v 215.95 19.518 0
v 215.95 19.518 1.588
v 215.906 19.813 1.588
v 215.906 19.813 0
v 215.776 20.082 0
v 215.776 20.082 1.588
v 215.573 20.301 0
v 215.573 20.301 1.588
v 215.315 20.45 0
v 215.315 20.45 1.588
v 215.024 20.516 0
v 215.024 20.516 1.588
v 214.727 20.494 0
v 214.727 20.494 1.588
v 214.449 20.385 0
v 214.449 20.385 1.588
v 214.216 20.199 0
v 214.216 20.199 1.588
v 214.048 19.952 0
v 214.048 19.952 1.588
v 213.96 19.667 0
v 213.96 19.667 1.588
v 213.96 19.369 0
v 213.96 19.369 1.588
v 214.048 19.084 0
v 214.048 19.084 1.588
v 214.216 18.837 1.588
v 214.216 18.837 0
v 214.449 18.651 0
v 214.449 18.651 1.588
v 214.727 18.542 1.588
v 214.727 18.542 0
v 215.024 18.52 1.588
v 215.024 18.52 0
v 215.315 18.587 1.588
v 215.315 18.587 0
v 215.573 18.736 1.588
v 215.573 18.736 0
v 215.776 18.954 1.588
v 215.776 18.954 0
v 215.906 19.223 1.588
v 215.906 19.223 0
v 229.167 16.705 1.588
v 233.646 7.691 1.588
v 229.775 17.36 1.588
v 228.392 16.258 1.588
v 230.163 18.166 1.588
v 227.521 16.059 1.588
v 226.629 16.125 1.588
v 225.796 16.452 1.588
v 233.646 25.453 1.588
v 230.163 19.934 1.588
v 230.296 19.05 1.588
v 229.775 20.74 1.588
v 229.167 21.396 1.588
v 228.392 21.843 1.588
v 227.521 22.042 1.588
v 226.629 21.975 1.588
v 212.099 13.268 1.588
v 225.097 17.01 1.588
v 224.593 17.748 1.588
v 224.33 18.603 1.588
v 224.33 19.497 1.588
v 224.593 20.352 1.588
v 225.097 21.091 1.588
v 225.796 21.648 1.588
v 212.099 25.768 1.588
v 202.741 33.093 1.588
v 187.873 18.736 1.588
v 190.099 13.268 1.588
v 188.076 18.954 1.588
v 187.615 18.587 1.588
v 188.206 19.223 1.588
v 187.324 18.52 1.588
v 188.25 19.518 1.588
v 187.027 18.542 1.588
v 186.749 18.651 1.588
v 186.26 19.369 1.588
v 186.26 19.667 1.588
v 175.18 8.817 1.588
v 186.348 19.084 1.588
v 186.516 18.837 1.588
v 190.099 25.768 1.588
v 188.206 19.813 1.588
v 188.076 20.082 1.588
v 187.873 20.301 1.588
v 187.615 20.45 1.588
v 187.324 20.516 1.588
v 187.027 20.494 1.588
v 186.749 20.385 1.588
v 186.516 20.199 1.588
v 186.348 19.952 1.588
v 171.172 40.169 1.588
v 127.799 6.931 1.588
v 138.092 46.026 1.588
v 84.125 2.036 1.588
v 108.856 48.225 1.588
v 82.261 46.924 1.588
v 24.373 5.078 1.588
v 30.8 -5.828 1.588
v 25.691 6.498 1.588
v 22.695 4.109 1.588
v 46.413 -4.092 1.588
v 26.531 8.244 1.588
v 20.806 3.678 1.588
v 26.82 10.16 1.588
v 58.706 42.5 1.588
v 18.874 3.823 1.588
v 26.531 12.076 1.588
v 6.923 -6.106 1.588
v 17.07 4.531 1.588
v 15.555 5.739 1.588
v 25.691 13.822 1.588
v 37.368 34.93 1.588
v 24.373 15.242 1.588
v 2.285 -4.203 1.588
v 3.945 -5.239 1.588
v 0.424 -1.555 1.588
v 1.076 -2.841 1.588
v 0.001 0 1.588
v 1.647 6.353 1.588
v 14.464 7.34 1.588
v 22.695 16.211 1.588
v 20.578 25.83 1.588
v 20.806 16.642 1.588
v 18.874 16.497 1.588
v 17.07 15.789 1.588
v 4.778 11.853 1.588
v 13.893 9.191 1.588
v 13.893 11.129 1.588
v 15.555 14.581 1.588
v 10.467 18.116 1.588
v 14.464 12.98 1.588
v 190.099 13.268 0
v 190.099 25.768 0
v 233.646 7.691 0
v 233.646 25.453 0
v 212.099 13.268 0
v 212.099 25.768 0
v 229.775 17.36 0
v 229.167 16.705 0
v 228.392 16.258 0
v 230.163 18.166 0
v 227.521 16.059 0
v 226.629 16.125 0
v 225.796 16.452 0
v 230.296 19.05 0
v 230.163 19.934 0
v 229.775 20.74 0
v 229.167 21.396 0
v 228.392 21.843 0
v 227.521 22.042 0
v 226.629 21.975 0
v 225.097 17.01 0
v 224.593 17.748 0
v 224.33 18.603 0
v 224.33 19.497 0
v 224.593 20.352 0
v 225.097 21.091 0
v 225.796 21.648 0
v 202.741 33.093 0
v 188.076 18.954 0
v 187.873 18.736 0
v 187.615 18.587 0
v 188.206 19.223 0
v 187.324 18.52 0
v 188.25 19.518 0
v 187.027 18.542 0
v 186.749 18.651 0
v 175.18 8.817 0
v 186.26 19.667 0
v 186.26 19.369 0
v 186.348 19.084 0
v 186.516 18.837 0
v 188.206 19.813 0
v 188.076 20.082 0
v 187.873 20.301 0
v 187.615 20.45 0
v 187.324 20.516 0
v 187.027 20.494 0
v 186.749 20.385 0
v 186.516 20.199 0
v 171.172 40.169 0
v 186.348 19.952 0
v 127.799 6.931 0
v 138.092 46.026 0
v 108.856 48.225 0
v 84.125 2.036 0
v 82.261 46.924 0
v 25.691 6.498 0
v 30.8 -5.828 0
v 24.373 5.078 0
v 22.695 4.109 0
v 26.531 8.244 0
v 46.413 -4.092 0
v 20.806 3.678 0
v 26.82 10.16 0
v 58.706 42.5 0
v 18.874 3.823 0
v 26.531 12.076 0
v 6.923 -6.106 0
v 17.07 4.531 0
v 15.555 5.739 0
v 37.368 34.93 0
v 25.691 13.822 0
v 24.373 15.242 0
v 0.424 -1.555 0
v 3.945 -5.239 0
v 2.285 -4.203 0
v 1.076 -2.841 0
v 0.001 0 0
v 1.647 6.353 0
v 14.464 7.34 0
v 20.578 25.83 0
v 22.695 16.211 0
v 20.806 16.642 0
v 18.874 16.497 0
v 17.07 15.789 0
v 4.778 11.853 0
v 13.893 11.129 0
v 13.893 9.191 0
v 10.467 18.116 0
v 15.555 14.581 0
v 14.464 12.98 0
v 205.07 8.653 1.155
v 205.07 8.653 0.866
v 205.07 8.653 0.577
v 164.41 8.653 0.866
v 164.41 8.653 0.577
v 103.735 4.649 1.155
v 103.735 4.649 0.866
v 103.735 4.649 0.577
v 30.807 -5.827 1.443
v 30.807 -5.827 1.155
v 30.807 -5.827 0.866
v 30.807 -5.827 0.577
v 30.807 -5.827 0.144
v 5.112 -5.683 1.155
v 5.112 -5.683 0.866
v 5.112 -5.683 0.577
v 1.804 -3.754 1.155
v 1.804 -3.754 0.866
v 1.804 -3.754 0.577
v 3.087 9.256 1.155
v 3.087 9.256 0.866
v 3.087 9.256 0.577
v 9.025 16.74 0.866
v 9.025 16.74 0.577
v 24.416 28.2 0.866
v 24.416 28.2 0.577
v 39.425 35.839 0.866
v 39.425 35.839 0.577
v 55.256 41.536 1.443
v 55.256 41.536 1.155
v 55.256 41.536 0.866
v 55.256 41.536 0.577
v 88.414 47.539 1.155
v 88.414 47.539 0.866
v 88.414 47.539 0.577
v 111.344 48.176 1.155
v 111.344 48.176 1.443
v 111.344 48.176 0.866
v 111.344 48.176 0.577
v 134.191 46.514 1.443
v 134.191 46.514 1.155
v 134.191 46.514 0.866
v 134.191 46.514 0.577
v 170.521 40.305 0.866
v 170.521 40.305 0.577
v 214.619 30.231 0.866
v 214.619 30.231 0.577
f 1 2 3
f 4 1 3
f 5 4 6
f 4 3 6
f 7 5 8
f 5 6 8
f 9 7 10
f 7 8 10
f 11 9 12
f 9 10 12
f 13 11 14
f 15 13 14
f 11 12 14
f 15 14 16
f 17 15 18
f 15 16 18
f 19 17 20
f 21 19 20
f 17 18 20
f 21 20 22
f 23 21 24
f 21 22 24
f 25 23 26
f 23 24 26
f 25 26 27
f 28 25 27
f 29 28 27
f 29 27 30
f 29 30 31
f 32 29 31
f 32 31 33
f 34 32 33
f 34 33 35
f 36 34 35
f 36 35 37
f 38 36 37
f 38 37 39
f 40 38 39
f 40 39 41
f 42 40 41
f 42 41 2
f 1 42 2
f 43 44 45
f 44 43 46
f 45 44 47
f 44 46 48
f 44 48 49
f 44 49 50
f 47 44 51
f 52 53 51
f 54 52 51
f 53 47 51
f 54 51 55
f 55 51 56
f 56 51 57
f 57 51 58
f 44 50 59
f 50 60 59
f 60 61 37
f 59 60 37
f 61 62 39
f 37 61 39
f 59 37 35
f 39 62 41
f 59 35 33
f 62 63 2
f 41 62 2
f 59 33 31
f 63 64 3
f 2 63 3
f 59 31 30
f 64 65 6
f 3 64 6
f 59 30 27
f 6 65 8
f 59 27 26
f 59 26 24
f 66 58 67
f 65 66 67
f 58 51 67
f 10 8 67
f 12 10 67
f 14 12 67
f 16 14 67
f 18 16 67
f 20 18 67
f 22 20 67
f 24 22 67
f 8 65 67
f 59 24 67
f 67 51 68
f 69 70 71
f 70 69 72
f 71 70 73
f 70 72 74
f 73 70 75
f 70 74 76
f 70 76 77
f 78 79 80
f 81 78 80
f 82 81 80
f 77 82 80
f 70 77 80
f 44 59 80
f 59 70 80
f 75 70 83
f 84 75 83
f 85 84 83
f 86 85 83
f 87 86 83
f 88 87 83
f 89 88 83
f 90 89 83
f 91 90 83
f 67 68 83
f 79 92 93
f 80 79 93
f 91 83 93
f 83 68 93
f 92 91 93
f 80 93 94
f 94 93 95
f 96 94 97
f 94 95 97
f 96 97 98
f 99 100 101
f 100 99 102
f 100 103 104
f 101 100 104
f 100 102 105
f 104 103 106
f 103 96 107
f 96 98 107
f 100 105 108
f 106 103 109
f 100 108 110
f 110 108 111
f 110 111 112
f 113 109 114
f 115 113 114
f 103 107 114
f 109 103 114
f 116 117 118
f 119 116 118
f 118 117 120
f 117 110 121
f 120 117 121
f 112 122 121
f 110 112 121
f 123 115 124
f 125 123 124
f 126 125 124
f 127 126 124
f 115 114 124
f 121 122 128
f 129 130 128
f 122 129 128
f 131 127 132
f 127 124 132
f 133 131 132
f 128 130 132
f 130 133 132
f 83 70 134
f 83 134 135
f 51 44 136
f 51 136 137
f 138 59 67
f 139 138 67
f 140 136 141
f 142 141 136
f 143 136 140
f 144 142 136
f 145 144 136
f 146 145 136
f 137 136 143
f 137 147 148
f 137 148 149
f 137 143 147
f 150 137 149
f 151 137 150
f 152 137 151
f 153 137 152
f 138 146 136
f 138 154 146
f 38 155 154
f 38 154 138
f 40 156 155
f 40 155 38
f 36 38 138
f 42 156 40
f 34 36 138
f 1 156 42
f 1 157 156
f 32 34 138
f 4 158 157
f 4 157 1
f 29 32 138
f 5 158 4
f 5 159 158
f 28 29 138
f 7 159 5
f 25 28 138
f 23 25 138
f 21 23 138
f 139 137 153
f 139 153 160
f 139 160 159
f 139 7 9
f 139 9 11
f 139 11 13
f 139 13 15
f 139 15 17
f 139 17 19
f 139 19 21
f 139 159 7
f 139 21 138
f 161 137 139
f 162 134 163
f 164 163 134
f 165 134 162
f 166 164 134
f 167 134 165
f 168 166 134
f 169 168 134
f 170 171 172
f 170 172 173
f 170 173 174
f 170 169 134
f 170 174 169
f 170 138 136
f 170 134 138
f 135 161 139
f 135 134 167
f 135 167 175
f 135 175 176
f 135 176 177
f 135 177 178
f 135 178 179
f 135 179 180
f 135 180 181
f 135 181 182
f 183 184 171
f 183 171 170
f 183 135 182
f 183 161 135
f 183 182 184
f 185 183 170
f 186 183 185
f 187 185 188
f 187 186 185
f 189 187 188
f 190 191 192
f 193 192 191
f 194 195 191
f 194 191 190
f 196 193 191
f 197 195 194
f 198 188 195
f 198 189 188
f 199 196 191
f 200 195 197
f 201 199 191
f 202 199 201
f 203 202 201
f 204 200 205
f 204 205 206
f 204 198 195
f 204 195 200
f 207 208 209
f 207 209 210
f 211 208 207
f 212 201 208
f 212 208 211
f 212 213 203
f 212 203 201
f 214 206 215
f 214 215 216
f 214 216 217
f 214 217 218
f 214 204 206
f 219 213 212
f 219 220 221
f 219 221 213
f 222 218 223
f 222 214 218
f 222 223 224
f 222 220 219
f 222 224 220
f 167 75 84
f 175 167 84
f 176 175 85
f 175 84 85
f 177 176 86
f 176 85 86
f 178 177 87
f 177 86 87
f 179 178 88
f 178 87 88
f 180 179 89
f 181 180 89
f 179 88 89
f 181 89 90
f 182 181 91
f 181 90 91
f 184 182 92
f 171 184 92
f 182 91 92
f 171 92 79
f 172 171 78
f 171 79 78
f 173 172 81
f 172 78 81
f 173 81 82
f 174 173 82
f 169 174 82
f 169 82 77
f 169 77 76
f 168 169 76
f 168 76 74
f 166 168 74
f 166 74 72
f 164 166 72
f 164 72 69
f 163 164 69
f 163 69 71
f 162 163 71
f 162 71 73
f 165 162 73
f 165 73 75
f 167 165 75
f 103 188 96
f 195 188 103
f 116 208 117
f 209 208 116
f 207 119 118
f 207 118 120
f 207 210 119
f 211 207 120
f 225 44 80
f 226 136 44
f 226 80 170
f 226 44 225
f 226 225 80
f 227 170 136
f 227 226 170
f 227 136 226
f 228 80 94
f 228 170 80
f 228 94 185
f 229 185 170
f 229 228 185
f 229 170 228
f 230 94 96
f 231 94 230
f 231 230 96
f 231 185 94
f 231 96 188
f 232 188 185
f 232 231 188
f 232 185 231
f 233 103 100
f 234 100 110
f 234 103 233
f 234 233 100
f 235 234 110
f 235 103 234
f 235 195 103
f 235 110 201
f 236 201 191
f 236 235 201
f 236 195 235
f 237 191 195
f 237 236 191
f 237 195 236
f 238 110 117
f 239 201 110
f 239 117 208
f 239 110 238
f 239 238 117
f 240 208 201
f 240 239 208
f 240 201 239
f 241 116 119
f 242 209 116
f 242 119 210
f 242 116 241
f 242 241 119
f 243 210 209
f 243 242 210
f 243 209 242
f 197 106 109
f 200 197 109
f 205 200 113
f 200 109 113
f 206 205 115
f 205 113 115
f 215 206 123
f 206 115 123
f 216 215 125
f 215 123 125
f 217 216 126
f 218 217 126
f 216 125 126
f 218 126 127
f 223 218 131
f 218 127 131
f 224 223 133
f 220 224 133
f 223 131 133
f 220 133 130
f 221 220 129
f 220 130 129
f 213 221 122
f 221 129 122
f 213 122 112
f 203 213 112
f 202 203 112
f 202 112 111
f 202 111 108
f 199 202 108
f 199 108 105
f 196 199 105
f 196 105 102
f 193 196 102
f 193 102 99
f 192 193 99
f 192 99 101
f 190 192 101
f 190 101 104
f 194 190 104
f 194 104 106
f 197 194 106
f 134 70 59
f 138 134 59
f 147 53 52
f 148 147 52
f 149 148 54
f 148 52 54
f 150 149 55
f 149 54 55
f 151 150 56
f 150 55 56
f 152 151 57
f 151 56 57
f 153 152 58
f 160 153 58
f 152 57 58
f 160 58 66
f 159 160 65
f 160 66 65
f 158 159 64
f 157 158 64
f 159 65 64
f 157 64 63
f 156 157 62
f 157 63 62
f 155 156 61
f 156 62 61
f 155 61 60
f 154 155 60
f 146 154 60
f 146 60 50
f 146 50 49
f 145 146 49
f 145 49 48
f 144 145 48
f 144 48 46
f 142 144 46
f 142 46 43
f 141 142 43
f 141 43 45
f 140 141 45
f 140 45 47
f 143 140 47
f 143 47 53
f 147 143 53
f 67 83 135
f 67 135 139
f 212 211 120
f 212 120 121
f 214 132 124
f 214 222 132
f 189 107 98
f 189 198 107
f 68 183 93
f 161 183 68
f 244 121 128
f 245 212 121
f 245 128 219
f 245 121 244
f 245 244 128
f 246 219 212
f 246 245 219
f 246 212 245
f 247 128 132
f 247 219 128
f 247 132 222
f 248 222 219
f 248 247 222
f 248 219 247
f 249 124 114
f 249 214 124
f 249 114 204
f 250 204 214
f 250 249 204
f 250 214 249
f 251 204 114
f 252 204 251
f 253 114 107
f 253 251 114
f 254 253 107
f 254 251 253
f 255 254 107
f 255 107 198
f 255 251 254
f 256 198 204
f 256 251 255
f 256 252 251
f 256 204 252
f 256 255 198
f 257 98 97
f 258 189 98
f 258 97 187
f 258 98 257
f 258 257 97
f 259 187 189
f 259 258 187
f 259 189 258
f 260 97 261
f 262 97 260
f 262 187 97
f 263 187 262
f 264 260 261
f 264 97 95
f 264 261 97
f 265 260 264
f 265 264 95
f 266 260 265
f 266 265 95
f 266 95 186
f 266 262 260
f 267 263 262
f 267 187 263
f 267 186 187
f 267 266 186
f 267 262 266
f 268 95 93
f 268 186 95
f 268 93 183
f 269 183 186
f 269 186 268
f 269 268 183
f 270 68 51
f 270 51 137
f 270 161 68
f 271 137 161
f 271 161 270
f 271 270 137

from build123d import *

# Parameters (mm, degrees)
BOSS_EXTRUDE1_DEPTH = 1.5875
SKETCH2_R           = 6.5
SKETCH2_R_2         = 3
CUT_EXTRUDE1_DEPTH  = 316.731983488
SKETCH3_W           = 116.84
SKETCH3_H           = 50.8
CUT_EXTRUDE2_DEPTH  = 316.731983488
SKETCH4_R           = 1.00076
SKETCH4_W           = 22
SKETCH4_H           = 12.5
CUT_EXTRUDE3_DEPTH  = 239.581081252


with BuildPart() as part:
    # Sketch1 → Boss-Extrude1 (new body)
    with BuildSketch(Plane.XY):
        with BuildLine():
            add(Edge.make_bspline(
                [(0.000560351, 0.000130087), (0.810633127, 7.359196055), (8.649092025, 17.856605174), (26.286719818, 29.975176328), (52.111128271, 42.069215275), (89.597618475, 49.290763054), (131.400792109, 47.884831915), (173.256699242, 40.041104278), (217.961060472, 29.612974894), (256.952064401, 19.528920948), (290.35983767, 8.71099439), (301.273197721, 4.382828139), (314.816918223, -0.516206742), (309.846313895, 0.000130087)],
                knots=[0, 0, 0, 0, 0.060863618, 0.113688265, 0.188608742, 0.312908923, 0.448482434, 0.557612135, 0.691544113, 0.852438279, 0.92975597, 0.976058229, 1, 1, 1, 1], degree=3))
            add(Edge.make_bspline(
                [(309.846313895, 0.000130087), (303.956832565, 1.47095521), (293.989507544, 2.093987313), (276.26402299, 4.514356704), (260.846344817, 5.427413394), (235.858814759, 7.870306192), (205.101424636, 8.838080282), (157.718638092, 9.030650149), (110.497331172, 6.181495223), (66.506197185, -0.586669107), (36.454672816, -6.098499901), (15.316603331, -6.189065841), (1.230714189, -6.924076091), (0.000560351, 0.000130087)],
                knots=[0, 0, 0, 0, 0.057787081, 0.095274891, 0.171021118, 0.205339302, 0.335319146, 0.464904334, 0.658702312, 0.785511947, 0.893517288, 0.94309214, 1, 1, 1, 1], degree=3))
        make_face()
    extrude(amount=BOSS_EXTRUDE1_DEPTH)

    # Sketch2 → Cut-Extrude1 (cut, through all)
    with BuildSketch(Plane.XY.offset(1.5875)):
        with Locations((20.32, 10.16)):
            Circle(SKETCH2_R)
        with Locations((227.296313895, 19.050130087)):
            Circle(SKETCH2_R_2)
    extrude(amount=-CUT_EXTRUDE1_DEPTH, mode=Mode.SUBTRACT)

    # Sketch3 → Cut-Extrude2 (cut, through all)
    with BuildSketch(Plane.XY.offset(1.5875)):
        with Locations((292.066313895, 19.050130087)):
            Rectangle(SKETCH3_W, SKETCH3_H)
    extrude(amount=-CUT_EXTRUDE2_DEPTH, mode=Mode.SUBTRACT)

    # Sketch4 → Cut-Extrude3 (cut, through all)
    with BuildSketch(Plane.XY.offset(1.5875)):
        with Locations((214.949245332, 19.518092278)):
            Circle(SKETCH4_R)
        with Locations((187.249245332, 19.518092278)):
            Circle(SKETCH4_R)
        with Locations((201.099245332, 19.518092278)):
            Rectangle(SKETCH4_W, SKETCH4_H)
    extrude(amount=-CUT_EXTRUDE3_DEPTH, mode=Mode.SUBTRACT)


solid = part.part
